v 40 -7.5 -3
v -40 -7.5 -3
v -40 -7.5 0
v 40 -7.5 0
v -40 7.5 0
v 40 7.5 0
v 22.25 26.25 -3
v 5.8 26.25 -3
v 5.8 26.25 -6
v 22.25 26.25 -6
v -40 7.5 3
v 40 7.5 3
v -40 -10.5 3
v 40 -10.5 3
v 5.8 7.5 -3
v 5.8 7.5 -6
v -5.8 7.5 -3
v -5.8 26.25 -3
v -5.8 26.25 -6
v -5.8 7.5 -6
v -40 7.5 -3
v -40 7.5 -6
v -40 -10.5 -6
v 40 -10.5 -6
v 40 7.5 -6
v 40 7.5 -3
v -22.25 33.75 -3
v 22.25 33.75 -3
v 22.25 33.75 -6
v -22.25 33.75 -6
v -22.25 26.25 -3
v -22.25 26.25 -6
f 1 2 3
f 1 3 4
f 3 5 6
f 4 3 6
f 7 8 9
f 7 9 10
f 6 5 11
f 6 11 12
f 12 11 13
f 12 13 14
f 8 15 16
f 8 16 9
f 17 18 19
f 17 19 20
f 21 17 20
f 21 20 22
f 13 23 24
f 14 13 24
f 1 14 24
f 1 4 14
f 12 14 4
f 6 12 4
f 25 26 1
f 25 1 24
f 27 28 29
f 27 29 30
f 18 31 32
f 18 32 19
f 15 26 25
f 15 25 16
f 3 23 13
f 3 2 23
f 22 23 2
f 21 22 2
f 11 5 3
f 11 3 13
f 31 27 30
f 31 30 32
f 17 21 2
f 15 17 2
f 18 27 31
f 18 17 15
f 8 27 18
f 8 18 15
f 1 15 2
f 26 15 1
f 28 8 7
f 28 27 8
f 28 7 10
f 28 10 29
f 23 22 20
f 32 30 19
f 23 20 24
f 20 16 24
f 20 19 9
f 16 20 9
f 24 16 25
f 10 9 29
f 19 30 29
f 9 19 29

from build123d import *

# Parameters (mm, degrees)
SKETCH1_W           = 80
SKETCH1_H           = 15
BOSS_EXTRUDE1_DEPTH = 3
BOSS_EXTRUDE2_DEPTH = 3
SKETCH2_W           = 80
SKETCH2_H           = 3
BOSS_EXTRUDE3_DEPTH = 3


with BuildPart() as part:
    # Sketch1 → Boss-Extrude1 (new body)
    with BuildSketch(Plane.XY):
        Rectangle(SKETCH1_W, SKETCH1_H)
    extrude(amount=BOSS_EXTRUDE1_DEPTH)



with BuildPart() as body_2:
    # Sketch3 → Boss-Extrude2 (new body)
    with BuildSketch(Plane(origin=(0, 0, -3), x_dir=(-1, 0, 0), z_dir=(0, 0, -1))):
        Polygon((40, -7.5), (-40, -7.5), (-40, 7.5), (-5.8, 7.5), (-5.8, 26.25), (-22.25, 26.25), (-22.25, 33.75), (22.25, 33.75), (22.25, 26.25), (5.8, 26.25), (5.8, 7.5), (40, 7.5), align=None)
    extrude(amount=BOSS_EXTRUDE2_DEPTH)


with BuildPart() as part_1:
    add(part.part)

    add(body_2.part)  # Boss-Extrude3 merges body 2
    # Sketch2 → Boss-Extrude3 (add)
    with BuildSketch(Plane(origin=(0, -7.5, 0), x_dir=(1, 0, 0), z_dir=(0, 1, 0))):
        with Locations((0, 4.5)):
            Rectangle(SKETCH2_W, SKETCH2_H)
        with Locations((0, 1.5)):
            Rectangle(SKETCH2_W, SKETCH2_H)
        with Locations((0, -1.5)):
            Rectangle(SKETCH2_W, SKETCH2_H)
    extrude(amount=-BOSS_EXTRUDE3_DEPTH)


solid = part_1.part
